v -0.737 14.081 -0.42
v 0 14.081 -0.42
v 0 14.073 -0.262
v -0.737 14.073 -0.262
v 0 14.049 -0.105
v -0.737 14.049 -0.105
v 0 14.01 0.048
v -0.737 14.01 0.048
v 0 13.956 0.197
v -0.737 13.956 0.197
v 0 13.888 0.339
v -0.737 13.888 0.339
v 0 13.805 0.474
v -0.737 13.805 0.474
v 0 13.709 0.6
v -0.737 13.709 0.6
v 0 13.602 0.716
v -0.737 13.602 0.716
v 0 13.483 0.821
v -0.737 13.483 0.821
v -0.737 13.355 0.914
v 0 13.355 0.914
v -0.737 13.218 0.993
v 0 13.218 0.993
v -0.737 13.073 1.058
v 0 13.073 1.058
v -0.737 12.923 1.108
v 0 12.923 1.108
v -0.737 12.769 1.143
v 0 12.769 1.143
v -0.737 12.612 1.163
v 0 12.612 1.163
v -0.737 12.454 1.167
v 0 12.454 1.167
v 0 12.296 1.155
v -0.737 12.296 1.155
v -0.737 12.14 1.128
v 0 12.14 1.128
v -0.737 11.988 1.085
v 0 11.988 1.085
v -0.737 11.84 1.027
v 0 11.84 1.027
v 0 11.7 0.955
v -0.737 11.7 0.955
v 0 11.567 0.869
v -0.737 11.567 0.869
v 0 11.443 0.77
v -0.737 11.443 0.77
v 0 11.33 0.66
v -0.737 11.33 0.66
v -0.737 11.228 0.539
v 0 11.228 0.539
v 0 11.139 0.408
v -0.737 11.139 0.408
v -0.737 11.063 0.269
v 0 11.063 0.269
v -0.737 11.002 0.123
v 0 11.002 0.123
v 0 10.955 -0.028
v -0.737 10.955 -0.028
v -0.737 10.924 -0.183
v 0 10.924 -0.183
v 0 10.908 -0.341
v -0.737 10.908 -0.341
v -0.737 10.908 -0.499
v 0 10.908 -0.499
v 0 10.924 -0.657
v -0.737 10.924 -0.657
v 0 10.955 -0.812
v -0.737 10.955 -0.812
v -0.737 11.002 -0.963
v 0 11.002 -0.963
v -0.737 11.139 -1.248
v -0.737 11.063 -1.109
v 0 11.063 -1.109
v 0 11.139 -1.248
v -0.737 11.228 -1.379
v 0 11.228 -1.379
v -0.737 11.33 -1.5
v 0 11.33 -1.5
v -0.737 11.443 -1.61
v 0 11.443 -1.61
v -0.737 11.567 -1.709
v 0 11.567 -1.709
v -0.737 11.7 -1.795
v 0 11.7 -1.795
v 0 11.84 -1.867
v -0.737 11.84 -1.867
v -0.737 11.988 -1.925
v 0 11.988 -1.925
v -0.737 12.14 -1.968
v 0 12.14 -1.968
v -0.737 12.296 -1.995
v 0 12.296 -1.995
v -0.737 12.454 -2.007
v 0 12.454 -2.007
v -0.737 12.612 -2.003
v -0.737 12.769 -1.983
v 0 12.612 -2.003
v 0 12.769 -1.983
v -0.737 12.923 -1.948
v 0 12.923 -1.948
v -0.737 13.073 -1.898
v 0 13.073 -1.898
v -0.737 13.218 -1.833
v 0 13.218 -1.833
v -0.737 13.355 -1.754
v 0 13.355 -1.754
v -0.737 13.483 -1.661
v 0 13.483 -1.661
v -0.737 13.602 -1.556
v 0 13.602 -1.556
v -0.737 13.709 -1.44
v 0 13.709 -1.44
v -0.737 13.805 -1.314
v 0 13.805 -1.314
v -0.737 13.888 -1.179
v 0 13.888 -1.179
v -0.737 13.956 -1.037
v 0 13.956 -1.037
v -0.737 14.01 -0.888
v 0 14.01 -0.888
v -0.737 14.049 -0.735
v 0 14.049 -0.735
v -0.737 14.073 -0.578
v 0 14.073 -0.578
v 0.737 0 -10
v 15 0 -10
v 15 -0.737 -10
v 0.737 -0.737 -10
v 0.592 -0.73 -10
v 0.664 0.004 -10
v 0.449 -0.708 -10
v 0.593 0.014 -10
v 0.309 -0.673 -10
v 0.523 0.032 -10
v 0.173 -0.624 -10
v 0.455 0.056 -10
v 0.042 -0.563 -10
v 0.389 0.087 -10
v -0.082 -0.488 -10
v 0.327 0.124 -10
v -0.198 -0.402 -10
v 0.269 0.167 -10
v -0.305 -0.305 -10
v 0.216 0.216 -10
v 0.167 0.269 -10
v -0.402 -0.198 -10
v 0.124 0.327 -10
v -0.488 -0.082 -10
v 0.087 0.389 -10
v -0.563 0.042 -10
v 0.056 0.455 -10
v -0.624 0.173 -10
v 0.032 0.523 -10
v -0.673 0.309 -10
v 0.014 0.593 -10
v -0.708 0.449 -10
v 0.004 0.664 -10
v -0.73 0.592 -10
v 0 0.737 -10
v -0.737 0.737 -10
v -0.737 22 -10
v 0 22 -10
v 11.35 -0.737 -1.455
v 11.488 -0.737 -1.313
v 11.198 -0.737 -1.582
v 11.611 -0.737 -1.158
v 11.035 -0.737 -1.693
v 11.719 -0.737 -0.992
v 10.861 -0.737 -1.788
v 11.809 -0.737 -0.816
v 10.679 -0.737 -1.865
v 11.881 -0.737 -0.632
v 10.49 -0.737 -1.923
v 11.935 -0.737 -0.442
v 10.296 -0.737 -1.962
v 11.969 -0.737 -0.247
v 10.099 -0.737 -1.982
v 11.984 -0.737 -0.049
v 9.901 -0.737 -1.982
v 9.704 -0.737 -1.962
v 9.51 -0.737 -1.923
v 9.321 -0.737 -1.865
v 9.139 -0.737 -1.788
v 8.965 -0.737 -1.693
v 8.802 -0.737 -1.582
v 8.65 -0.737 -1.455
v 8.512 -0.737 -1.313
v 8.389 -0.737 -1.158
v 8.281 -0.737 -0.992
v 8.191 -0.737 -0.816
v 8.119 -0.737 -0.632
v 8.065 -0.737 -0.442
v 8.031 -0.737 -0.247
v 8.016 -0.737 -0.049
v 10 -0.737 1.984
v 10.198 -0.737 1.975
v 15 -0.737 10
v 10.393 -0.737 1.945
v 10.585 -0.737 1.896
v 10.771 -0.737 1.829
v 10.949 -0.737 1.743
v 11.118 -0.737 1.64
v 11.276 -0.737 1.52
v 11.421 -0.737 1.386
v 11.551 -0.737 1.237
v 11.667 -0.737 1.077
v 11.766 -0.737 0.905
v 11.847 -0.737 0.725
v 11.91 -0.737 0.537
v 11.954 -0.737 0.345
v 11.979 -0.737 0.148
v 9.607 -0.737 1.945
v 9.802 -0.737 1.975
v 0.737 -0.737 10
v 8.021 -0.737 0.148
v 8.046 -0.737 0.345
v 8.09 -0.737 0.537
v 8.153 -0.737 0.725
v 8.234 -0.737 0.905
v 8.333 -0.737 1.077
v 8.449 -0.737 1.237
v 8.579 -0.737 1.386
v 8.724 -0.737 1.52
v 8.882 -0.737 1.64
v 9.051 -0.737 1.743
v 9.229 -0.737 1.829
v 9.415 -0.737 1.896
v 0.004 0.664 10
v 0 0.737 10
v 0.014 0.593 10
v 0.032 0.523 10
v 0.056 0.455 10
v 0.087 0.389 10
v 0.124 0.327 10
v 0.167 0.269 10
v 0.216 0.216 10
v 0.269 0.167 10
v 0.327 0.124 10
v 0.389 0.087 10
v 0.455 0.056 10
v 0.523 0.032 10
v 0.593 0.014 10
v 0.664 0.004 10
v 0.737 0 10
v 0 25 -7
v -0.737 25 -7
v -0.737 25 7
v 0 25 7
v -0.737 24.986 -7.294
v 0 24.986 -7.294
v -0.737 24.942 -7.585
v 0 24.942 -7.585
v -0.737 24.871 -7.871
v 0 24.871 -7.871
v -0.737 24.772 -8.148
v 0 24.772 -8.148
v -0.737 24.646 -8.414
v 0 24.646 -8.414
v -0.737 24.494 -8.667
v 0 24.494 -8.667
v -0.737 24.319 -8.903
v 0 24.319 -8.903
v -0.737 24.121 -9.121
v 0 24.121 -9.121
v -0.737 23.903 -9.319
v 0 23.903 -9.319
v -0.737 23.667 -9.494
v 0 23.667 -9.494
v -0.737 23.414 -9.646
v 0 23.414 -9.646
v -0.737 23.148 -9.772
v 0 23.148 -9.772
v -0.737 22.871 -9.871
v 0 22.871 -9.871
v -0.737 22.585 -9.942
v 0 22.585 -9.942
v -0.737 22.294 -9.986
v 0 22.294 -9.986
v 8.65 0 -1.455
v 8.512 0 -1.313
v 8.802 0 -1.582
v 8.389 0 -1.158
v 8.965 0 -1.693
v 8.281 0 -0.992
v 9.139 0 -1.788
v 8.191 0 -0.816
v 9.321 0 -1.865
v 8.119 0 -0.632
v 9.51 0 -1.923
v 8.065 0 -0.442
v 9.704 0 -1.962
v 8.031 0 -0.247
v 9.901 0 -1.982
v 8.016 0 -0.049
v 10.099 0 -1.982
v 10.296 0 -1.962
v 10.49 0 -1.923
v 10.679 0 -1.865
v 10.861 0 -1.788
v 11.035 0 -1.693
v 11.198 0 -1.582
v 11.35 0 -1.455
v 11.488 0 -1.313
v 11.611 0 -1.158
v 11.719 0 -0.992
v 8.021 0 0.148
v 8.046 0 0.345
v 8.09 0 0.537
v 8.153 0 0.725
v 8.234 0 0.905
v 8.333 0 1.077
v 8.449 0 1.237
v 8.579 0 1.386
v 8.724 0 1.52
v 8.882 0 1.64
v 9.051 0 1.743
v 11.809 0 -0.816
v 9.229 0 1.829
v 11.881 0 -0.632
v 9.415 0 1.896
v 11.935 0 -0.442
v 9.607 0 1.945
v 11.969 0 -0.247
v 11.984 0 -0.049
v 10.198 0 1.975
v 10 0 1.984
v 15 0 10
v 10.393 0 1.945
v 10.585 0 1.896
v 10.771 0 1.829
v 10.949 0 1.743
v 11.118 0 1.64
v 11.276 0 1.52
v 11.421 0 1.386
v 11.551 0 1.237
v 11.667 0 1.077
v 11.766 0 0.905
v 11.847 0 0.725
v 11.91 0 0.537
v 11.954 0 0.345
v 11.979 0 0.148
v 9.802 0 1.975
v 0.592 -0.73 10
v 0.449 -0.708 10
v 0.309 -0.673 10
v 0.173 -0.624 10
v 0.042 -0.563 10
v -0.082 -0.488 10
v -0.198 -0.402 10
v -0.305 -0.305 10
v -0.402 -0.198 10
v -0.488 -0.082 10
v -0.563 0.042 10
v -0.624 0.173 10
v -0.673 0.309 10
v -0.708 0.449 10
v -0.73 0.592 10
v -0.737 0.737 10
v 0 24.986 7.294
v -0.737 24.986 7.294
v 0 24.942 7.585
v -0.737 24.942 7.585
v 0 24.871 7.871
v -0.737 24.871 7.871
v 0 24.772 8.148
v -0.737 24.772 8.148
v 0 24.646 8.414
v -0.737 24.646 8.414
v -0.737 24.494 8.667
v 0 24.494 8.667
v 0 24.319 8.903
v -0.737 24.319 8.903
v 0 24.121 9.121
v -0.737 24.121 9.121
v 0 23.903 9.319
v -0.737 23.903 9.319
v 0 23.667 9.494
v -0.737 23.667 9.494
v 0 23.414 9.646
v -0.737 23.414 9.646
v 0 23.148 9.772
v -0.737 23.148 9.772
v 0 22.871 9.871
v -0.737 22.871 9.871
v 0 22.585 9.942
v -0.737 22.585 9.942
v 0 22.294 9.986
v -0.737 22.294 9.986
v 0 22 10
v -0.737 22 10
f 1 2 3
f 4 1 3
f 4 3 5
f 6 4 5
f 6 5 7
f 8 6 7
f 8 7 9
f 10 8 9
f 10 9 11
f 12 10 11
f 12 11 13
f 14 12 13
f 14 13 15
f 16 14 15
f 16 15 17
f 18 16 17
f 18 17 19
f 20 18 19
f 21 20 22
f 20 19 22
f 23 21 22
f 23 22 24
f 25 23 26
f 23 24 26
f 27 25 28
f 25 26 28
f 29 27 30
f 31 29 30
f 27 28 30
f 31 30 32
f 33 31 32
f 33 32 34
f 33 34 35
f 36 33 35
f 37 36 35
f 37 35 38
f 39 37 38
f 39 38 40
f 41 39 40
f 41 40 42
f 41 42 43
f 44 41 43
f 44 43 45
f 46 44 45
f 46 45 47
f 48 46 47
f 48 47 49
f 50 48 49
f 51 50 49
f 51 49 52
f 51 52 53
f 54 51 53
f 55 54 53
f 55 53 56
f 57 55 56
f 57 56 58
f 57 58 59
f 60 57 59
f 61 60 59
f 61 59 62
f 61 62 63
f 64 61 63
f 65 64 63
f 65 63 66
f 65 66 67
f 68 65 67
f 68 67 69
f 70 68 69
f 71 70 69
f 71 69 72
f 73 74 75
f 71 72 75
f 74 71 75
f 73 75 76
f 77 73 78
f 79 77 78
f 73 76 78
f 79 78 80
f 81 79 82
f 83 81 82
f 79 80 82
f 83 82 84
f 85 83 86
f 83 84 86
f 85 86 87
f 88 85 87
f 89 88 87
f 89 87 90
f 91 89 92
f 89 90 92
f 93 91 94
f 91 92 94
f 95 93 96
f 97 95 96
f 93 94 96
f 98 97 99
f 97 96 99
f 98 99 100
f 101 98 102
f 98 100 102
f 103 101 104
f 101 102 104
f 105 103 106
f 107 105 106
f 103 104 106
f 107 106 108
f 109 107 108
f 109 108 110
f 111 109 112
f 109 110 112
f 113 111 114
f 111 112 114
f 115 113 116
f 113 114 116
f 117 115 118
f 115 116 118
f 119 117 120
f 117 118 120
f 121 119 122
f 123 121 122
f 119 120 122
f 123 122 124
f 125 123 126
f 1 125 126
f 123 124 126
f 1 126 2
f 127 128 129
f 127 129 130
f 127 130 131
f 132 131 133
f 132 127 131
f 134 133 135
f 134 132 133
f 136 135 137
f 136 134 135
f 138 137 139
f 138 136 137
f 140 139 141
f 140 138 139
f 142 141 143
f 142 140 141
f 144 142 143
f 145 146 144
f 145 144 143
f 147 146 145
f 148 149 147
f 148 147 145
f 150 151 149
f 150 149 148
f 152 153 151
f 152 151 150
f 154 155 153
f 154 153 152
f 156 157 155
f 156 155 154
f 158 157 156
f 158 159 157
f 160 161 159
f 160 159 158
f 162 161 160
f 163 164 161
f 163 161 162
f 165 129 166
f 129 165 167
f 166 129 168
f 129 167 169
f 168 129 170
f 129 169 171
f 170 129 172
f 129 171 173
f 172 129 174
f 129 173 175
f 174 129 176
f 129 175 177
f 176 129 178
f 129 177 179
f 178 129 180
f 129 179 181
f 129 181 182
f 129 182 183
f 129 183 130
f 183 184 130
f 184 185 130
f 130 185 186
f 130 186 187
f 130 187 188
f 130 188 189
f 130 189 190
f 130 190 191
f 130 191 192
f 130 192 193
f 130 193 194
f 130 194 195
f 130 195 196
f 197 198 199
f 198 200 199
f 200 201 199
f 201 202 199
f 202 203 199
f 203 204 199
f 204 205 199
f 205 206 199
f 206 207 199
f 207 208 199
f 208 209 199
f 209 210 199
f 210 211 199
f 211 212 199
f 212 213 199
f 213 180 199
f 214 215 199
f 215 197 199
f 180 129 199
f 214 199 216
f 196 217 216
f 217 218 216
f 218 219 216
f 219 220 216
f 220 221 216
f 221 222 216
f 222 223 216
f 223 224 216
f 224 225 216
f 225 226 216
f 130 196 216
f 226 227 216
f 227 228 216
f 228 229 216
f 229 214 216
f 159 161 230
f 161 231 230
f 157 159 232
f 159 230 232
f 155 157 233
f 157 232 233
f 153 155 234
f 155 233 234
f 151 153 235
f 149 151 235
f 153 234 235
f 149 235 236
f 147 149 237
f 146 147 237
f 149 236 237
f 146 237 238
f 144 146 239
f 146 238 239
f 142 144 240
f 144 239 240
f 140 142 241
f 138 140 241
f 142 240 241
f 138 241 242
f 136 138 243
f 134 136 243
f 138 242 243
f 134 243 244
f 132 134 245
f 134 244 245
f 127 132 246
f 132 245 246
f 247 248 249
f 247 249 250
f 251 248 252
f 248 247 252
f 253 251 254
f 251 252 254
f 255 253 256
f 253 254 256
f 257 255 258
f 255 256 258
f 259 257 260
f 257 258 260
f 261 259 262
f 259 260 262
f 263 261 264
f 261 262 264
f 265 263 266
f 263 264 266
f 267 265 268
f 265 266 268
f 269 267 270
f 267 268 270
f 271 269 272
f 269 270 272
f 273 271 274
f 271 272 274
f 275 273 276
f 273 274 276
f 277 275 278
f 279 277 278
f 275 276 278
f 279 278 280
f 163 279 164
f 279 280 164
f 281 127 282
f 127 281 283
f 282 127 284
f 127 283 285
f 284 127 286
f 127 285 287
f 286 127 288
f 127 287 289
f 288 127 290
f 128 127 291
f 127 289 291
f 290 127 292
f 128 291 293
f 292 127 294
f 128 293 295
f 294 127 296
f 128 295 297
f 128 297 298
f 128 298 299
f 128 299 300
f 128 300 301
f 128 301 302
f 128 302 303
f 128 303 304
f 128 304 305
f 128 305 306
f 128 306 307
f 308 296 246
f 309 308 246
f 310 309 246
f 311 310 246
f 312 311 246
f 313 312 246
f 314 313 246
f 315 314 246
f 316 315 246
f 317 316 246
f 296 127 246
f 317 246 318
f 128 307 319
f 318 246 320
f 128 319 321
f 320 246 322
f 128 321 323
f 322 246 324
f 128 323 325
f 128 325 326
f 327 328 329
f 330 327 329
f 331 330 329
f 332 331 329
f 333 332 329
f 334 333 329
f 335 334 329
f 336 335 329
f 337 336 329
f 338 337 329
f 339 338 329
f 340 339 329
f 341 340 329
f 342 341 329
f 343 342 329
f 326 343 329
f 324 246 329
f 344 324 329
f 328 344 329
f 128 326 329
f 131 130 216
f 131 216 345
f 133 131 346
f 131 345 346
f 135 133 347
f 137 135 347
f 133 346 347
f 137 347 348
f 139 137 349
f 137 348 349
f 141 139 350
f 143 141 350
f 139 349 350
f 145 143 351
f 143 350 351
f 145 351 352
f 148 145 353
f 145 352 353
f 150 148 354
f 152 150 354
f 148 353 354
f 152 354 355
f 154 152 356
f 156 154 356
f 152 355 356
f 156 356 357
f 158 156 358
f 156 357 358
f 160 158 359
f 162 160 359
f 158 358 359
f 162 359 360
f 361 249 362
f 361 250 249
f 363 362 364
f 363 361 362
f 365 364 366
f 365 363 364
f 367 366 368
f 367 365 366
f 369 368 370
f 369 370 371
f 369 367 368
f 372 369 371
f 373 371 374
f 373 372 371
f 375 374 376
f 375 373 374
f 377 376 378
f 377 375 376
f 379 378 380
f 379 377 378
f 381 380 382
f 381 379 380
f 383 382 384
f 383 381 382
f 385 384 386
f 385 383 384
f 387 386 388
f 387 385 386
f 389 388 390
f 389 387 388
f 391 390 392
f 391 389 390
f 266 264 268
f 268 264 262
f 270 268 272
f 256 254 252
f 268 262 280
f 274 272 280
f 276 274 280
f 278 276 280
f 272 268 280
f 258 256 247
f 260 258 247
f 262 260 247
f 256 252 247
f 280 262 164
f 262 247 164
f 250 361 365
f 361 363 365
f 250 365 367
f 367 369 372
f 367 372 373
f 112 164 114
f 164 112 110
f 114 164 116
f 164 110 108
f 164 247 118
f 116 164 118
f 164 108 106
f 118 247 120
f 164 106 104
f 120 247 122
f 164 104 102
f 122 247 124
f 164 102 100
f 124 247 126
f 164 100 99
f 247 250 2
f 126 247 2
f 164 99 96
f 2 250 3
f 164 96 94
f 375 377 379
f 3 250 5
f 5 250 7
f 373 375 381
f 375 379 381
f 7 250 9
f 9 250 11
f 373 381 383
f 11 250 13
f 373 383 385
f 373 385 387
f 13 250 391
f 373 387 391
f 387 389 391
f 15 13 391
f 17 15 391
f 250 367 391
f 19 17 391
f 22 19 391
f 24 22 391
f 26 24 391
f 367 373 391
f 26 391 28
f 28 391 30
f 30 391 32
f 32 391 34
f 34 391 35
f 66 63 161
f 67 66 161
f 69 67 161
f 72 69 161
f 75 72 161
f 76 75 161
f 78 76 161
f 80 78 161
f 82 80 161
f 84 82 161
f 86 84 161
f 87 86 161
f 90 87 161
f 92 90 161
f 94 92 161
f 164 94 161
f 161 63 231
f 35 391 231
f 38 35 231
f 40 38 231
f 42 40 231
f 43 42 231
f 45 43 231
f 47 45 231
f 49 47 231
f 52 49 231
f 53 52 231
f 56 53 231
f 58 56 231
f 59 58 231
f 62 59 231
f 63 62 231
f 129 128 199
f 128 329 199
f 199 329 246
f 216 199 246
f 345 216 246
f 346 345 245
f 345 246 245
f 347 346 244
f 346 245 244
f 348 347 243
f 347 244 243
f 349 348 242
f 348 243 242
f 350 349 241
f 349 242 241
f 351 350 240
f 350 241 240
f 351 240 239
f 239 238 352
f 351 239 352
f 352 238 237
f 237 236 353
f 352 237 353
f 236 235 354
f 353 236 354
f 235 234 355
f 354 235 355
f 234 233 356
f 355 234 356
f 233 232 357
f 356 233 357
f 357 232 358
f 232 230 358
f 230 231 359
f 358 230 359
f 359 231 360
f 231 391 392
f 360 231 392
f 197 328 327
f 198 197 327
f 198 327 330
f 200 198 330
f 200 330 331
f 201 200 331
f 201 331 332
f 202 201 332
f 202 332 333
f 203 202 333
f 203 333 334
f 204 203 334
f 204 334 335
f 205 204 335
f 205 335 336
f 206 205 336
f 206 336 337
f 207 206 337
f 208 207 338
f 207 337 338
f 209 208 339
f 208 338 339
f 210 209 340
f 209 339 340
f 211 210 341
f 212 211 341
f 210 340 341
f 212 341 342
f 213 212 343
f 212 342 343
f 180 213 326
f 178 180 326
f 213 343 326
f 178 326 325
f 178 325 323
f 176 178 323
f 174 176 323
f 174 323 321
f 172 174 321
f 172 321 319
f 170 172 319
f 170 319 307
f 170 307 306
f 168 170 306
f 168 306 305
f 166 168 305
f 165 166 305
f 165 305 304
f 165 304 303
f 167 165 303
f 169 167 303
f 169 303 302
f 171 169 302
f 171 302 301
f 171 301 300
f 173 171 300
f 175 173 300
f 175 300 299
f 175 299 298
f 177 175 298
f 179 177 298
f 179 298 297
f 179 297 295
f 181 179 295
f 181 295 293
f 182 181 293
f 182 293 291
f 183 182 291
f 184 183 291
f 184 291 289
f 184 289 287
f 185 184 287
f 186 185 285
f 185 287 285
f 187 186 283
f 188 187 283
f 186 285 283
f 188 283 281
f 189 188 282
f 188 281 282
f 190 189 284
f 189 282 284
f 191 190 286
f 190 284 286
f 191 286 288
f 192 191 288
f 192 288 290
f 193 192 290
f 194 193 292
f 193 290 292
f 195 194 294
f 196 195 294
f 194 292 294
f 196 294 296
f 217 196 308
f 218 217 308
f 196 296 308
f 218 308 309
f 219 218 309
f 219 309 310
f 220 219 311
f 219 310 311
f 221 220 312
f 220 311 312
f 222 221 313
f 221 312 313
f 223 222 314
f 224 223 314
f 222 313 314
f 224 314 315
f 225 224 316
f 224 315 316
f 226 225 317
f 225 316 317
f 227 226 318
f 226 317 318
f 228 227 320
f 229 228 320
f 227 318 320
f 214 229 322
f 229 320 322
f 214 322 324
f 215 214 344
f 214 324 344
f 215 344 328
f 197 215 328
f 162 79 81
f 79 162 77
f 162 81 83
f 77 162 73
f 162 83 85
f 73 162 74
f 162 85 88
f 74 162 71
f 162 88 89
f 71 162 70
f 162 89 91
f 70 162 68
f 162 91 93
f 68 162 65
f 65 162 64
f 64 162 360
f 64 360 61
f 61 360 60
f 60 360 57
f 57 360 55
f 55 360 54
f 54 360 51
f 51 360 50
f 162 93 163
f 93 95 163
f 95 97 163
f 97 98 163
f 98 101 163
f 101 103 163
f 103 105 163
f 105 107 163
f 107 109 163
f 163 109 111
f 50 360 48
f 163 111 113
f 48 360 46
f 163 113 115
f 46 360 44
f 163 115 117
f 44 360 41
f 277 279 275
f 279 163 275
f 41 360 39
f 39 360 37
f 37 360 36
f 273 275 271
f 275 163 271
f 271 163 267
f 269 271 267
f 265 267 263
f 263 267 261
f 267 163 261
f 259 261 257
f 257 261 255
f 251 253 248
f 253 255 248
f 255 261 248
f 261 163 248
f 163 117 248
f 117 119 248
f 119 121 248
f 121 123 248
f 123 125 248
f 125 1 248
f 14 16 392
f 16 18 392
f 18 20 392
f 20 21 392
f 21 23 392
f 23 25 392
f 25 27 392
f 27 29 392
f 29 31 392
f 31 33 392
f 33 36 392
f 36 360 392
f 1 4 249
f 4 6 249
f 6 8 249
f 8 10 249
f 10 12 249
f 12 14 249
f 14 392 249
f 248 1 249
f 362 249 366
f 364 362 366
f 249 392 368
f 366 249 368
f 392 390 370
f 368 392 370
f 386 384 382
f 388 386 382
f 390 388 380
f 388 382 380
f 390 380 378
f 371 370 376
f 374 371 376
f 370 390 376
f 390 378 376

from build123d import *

# Parameters (mm, degrees)
BASE_FLANGE1_DEPTH = 10
SKETCH7_R          = 1.5875
CUT_EXTRUDE1_DEPTH = 31.822070015
SKETCH8_R          = 1.984375
CUT_EXTRUDE2_DEPTH = 31.822070015
FILLET1_R          = 3


# Sheet-metal steps are written as plain solids
with BuildPart() as part:
    # Sketch2 → Base-Flange1 (new, symmetric)
    with BuildSketch(Plane.XY):
        with BuildLine():
            Line((0, 25), (0, 0.7366))
            ThreePointArc((0, 0.7366), (0.215745145, 0.215745145), (0.7366, 0))
            Line((0.7366, 0), (15, 0))
            Line((15, 0), (15, -0.7366))
            Line((15, -0.7366), (0.7366, -0.7366))
            ThreePointArc((0.7366, -0.7366), (-0.30510971, -0.30510971), (-0.7366, 0.7366))
            Line((-0.7366, 0.7366), (-0.7366, 25))
            Line((-0.7366, 25), (0, 25))
        make_face()
    extrude(amount=BASE_FLANGE1_DEPTH, both=True)

    # Sketch7 → Cut-Extrude1 (cut, through all)
    with BuildSketch(Plane(origin=(0, 0, 0), x_dir=(0, 0, -1), z_dir=(1, 0, 0))):
        with Locations(Location((0.42, 12.4934, 0), (0, 0, 90))):
            Circle(SKETCH7_R)
    extrude(amount=-CUT_EXTRUDE1_DEPTH, mode=Mode.SUBTRACT)

    # Sketch8 → Cut-Extrude2 (cut, through all)
    with BuildSketch(Plane(origin=(0, 0, 0), x_dir=(1, 0, 0), z_dir=(0, 1, 0))):
        with Locations(Location((10, 0, 0), (0, 0, 270))):
            Circle(SKETCH8_R)
    extrude(amount=-CUT_EXTRUDE2_DEPTH, mode=Mode.SUBTRACT)

    # Fillet1
    fillet1_edges = [part.edges().sort_by_distance(p)[0] for p in [
        (-0.3683, 25, 10),
        (-0.3683, 25, -10),
    ]]
    fillet(fillet1_edges, radius=FILLET1_R)


solid = part.part
